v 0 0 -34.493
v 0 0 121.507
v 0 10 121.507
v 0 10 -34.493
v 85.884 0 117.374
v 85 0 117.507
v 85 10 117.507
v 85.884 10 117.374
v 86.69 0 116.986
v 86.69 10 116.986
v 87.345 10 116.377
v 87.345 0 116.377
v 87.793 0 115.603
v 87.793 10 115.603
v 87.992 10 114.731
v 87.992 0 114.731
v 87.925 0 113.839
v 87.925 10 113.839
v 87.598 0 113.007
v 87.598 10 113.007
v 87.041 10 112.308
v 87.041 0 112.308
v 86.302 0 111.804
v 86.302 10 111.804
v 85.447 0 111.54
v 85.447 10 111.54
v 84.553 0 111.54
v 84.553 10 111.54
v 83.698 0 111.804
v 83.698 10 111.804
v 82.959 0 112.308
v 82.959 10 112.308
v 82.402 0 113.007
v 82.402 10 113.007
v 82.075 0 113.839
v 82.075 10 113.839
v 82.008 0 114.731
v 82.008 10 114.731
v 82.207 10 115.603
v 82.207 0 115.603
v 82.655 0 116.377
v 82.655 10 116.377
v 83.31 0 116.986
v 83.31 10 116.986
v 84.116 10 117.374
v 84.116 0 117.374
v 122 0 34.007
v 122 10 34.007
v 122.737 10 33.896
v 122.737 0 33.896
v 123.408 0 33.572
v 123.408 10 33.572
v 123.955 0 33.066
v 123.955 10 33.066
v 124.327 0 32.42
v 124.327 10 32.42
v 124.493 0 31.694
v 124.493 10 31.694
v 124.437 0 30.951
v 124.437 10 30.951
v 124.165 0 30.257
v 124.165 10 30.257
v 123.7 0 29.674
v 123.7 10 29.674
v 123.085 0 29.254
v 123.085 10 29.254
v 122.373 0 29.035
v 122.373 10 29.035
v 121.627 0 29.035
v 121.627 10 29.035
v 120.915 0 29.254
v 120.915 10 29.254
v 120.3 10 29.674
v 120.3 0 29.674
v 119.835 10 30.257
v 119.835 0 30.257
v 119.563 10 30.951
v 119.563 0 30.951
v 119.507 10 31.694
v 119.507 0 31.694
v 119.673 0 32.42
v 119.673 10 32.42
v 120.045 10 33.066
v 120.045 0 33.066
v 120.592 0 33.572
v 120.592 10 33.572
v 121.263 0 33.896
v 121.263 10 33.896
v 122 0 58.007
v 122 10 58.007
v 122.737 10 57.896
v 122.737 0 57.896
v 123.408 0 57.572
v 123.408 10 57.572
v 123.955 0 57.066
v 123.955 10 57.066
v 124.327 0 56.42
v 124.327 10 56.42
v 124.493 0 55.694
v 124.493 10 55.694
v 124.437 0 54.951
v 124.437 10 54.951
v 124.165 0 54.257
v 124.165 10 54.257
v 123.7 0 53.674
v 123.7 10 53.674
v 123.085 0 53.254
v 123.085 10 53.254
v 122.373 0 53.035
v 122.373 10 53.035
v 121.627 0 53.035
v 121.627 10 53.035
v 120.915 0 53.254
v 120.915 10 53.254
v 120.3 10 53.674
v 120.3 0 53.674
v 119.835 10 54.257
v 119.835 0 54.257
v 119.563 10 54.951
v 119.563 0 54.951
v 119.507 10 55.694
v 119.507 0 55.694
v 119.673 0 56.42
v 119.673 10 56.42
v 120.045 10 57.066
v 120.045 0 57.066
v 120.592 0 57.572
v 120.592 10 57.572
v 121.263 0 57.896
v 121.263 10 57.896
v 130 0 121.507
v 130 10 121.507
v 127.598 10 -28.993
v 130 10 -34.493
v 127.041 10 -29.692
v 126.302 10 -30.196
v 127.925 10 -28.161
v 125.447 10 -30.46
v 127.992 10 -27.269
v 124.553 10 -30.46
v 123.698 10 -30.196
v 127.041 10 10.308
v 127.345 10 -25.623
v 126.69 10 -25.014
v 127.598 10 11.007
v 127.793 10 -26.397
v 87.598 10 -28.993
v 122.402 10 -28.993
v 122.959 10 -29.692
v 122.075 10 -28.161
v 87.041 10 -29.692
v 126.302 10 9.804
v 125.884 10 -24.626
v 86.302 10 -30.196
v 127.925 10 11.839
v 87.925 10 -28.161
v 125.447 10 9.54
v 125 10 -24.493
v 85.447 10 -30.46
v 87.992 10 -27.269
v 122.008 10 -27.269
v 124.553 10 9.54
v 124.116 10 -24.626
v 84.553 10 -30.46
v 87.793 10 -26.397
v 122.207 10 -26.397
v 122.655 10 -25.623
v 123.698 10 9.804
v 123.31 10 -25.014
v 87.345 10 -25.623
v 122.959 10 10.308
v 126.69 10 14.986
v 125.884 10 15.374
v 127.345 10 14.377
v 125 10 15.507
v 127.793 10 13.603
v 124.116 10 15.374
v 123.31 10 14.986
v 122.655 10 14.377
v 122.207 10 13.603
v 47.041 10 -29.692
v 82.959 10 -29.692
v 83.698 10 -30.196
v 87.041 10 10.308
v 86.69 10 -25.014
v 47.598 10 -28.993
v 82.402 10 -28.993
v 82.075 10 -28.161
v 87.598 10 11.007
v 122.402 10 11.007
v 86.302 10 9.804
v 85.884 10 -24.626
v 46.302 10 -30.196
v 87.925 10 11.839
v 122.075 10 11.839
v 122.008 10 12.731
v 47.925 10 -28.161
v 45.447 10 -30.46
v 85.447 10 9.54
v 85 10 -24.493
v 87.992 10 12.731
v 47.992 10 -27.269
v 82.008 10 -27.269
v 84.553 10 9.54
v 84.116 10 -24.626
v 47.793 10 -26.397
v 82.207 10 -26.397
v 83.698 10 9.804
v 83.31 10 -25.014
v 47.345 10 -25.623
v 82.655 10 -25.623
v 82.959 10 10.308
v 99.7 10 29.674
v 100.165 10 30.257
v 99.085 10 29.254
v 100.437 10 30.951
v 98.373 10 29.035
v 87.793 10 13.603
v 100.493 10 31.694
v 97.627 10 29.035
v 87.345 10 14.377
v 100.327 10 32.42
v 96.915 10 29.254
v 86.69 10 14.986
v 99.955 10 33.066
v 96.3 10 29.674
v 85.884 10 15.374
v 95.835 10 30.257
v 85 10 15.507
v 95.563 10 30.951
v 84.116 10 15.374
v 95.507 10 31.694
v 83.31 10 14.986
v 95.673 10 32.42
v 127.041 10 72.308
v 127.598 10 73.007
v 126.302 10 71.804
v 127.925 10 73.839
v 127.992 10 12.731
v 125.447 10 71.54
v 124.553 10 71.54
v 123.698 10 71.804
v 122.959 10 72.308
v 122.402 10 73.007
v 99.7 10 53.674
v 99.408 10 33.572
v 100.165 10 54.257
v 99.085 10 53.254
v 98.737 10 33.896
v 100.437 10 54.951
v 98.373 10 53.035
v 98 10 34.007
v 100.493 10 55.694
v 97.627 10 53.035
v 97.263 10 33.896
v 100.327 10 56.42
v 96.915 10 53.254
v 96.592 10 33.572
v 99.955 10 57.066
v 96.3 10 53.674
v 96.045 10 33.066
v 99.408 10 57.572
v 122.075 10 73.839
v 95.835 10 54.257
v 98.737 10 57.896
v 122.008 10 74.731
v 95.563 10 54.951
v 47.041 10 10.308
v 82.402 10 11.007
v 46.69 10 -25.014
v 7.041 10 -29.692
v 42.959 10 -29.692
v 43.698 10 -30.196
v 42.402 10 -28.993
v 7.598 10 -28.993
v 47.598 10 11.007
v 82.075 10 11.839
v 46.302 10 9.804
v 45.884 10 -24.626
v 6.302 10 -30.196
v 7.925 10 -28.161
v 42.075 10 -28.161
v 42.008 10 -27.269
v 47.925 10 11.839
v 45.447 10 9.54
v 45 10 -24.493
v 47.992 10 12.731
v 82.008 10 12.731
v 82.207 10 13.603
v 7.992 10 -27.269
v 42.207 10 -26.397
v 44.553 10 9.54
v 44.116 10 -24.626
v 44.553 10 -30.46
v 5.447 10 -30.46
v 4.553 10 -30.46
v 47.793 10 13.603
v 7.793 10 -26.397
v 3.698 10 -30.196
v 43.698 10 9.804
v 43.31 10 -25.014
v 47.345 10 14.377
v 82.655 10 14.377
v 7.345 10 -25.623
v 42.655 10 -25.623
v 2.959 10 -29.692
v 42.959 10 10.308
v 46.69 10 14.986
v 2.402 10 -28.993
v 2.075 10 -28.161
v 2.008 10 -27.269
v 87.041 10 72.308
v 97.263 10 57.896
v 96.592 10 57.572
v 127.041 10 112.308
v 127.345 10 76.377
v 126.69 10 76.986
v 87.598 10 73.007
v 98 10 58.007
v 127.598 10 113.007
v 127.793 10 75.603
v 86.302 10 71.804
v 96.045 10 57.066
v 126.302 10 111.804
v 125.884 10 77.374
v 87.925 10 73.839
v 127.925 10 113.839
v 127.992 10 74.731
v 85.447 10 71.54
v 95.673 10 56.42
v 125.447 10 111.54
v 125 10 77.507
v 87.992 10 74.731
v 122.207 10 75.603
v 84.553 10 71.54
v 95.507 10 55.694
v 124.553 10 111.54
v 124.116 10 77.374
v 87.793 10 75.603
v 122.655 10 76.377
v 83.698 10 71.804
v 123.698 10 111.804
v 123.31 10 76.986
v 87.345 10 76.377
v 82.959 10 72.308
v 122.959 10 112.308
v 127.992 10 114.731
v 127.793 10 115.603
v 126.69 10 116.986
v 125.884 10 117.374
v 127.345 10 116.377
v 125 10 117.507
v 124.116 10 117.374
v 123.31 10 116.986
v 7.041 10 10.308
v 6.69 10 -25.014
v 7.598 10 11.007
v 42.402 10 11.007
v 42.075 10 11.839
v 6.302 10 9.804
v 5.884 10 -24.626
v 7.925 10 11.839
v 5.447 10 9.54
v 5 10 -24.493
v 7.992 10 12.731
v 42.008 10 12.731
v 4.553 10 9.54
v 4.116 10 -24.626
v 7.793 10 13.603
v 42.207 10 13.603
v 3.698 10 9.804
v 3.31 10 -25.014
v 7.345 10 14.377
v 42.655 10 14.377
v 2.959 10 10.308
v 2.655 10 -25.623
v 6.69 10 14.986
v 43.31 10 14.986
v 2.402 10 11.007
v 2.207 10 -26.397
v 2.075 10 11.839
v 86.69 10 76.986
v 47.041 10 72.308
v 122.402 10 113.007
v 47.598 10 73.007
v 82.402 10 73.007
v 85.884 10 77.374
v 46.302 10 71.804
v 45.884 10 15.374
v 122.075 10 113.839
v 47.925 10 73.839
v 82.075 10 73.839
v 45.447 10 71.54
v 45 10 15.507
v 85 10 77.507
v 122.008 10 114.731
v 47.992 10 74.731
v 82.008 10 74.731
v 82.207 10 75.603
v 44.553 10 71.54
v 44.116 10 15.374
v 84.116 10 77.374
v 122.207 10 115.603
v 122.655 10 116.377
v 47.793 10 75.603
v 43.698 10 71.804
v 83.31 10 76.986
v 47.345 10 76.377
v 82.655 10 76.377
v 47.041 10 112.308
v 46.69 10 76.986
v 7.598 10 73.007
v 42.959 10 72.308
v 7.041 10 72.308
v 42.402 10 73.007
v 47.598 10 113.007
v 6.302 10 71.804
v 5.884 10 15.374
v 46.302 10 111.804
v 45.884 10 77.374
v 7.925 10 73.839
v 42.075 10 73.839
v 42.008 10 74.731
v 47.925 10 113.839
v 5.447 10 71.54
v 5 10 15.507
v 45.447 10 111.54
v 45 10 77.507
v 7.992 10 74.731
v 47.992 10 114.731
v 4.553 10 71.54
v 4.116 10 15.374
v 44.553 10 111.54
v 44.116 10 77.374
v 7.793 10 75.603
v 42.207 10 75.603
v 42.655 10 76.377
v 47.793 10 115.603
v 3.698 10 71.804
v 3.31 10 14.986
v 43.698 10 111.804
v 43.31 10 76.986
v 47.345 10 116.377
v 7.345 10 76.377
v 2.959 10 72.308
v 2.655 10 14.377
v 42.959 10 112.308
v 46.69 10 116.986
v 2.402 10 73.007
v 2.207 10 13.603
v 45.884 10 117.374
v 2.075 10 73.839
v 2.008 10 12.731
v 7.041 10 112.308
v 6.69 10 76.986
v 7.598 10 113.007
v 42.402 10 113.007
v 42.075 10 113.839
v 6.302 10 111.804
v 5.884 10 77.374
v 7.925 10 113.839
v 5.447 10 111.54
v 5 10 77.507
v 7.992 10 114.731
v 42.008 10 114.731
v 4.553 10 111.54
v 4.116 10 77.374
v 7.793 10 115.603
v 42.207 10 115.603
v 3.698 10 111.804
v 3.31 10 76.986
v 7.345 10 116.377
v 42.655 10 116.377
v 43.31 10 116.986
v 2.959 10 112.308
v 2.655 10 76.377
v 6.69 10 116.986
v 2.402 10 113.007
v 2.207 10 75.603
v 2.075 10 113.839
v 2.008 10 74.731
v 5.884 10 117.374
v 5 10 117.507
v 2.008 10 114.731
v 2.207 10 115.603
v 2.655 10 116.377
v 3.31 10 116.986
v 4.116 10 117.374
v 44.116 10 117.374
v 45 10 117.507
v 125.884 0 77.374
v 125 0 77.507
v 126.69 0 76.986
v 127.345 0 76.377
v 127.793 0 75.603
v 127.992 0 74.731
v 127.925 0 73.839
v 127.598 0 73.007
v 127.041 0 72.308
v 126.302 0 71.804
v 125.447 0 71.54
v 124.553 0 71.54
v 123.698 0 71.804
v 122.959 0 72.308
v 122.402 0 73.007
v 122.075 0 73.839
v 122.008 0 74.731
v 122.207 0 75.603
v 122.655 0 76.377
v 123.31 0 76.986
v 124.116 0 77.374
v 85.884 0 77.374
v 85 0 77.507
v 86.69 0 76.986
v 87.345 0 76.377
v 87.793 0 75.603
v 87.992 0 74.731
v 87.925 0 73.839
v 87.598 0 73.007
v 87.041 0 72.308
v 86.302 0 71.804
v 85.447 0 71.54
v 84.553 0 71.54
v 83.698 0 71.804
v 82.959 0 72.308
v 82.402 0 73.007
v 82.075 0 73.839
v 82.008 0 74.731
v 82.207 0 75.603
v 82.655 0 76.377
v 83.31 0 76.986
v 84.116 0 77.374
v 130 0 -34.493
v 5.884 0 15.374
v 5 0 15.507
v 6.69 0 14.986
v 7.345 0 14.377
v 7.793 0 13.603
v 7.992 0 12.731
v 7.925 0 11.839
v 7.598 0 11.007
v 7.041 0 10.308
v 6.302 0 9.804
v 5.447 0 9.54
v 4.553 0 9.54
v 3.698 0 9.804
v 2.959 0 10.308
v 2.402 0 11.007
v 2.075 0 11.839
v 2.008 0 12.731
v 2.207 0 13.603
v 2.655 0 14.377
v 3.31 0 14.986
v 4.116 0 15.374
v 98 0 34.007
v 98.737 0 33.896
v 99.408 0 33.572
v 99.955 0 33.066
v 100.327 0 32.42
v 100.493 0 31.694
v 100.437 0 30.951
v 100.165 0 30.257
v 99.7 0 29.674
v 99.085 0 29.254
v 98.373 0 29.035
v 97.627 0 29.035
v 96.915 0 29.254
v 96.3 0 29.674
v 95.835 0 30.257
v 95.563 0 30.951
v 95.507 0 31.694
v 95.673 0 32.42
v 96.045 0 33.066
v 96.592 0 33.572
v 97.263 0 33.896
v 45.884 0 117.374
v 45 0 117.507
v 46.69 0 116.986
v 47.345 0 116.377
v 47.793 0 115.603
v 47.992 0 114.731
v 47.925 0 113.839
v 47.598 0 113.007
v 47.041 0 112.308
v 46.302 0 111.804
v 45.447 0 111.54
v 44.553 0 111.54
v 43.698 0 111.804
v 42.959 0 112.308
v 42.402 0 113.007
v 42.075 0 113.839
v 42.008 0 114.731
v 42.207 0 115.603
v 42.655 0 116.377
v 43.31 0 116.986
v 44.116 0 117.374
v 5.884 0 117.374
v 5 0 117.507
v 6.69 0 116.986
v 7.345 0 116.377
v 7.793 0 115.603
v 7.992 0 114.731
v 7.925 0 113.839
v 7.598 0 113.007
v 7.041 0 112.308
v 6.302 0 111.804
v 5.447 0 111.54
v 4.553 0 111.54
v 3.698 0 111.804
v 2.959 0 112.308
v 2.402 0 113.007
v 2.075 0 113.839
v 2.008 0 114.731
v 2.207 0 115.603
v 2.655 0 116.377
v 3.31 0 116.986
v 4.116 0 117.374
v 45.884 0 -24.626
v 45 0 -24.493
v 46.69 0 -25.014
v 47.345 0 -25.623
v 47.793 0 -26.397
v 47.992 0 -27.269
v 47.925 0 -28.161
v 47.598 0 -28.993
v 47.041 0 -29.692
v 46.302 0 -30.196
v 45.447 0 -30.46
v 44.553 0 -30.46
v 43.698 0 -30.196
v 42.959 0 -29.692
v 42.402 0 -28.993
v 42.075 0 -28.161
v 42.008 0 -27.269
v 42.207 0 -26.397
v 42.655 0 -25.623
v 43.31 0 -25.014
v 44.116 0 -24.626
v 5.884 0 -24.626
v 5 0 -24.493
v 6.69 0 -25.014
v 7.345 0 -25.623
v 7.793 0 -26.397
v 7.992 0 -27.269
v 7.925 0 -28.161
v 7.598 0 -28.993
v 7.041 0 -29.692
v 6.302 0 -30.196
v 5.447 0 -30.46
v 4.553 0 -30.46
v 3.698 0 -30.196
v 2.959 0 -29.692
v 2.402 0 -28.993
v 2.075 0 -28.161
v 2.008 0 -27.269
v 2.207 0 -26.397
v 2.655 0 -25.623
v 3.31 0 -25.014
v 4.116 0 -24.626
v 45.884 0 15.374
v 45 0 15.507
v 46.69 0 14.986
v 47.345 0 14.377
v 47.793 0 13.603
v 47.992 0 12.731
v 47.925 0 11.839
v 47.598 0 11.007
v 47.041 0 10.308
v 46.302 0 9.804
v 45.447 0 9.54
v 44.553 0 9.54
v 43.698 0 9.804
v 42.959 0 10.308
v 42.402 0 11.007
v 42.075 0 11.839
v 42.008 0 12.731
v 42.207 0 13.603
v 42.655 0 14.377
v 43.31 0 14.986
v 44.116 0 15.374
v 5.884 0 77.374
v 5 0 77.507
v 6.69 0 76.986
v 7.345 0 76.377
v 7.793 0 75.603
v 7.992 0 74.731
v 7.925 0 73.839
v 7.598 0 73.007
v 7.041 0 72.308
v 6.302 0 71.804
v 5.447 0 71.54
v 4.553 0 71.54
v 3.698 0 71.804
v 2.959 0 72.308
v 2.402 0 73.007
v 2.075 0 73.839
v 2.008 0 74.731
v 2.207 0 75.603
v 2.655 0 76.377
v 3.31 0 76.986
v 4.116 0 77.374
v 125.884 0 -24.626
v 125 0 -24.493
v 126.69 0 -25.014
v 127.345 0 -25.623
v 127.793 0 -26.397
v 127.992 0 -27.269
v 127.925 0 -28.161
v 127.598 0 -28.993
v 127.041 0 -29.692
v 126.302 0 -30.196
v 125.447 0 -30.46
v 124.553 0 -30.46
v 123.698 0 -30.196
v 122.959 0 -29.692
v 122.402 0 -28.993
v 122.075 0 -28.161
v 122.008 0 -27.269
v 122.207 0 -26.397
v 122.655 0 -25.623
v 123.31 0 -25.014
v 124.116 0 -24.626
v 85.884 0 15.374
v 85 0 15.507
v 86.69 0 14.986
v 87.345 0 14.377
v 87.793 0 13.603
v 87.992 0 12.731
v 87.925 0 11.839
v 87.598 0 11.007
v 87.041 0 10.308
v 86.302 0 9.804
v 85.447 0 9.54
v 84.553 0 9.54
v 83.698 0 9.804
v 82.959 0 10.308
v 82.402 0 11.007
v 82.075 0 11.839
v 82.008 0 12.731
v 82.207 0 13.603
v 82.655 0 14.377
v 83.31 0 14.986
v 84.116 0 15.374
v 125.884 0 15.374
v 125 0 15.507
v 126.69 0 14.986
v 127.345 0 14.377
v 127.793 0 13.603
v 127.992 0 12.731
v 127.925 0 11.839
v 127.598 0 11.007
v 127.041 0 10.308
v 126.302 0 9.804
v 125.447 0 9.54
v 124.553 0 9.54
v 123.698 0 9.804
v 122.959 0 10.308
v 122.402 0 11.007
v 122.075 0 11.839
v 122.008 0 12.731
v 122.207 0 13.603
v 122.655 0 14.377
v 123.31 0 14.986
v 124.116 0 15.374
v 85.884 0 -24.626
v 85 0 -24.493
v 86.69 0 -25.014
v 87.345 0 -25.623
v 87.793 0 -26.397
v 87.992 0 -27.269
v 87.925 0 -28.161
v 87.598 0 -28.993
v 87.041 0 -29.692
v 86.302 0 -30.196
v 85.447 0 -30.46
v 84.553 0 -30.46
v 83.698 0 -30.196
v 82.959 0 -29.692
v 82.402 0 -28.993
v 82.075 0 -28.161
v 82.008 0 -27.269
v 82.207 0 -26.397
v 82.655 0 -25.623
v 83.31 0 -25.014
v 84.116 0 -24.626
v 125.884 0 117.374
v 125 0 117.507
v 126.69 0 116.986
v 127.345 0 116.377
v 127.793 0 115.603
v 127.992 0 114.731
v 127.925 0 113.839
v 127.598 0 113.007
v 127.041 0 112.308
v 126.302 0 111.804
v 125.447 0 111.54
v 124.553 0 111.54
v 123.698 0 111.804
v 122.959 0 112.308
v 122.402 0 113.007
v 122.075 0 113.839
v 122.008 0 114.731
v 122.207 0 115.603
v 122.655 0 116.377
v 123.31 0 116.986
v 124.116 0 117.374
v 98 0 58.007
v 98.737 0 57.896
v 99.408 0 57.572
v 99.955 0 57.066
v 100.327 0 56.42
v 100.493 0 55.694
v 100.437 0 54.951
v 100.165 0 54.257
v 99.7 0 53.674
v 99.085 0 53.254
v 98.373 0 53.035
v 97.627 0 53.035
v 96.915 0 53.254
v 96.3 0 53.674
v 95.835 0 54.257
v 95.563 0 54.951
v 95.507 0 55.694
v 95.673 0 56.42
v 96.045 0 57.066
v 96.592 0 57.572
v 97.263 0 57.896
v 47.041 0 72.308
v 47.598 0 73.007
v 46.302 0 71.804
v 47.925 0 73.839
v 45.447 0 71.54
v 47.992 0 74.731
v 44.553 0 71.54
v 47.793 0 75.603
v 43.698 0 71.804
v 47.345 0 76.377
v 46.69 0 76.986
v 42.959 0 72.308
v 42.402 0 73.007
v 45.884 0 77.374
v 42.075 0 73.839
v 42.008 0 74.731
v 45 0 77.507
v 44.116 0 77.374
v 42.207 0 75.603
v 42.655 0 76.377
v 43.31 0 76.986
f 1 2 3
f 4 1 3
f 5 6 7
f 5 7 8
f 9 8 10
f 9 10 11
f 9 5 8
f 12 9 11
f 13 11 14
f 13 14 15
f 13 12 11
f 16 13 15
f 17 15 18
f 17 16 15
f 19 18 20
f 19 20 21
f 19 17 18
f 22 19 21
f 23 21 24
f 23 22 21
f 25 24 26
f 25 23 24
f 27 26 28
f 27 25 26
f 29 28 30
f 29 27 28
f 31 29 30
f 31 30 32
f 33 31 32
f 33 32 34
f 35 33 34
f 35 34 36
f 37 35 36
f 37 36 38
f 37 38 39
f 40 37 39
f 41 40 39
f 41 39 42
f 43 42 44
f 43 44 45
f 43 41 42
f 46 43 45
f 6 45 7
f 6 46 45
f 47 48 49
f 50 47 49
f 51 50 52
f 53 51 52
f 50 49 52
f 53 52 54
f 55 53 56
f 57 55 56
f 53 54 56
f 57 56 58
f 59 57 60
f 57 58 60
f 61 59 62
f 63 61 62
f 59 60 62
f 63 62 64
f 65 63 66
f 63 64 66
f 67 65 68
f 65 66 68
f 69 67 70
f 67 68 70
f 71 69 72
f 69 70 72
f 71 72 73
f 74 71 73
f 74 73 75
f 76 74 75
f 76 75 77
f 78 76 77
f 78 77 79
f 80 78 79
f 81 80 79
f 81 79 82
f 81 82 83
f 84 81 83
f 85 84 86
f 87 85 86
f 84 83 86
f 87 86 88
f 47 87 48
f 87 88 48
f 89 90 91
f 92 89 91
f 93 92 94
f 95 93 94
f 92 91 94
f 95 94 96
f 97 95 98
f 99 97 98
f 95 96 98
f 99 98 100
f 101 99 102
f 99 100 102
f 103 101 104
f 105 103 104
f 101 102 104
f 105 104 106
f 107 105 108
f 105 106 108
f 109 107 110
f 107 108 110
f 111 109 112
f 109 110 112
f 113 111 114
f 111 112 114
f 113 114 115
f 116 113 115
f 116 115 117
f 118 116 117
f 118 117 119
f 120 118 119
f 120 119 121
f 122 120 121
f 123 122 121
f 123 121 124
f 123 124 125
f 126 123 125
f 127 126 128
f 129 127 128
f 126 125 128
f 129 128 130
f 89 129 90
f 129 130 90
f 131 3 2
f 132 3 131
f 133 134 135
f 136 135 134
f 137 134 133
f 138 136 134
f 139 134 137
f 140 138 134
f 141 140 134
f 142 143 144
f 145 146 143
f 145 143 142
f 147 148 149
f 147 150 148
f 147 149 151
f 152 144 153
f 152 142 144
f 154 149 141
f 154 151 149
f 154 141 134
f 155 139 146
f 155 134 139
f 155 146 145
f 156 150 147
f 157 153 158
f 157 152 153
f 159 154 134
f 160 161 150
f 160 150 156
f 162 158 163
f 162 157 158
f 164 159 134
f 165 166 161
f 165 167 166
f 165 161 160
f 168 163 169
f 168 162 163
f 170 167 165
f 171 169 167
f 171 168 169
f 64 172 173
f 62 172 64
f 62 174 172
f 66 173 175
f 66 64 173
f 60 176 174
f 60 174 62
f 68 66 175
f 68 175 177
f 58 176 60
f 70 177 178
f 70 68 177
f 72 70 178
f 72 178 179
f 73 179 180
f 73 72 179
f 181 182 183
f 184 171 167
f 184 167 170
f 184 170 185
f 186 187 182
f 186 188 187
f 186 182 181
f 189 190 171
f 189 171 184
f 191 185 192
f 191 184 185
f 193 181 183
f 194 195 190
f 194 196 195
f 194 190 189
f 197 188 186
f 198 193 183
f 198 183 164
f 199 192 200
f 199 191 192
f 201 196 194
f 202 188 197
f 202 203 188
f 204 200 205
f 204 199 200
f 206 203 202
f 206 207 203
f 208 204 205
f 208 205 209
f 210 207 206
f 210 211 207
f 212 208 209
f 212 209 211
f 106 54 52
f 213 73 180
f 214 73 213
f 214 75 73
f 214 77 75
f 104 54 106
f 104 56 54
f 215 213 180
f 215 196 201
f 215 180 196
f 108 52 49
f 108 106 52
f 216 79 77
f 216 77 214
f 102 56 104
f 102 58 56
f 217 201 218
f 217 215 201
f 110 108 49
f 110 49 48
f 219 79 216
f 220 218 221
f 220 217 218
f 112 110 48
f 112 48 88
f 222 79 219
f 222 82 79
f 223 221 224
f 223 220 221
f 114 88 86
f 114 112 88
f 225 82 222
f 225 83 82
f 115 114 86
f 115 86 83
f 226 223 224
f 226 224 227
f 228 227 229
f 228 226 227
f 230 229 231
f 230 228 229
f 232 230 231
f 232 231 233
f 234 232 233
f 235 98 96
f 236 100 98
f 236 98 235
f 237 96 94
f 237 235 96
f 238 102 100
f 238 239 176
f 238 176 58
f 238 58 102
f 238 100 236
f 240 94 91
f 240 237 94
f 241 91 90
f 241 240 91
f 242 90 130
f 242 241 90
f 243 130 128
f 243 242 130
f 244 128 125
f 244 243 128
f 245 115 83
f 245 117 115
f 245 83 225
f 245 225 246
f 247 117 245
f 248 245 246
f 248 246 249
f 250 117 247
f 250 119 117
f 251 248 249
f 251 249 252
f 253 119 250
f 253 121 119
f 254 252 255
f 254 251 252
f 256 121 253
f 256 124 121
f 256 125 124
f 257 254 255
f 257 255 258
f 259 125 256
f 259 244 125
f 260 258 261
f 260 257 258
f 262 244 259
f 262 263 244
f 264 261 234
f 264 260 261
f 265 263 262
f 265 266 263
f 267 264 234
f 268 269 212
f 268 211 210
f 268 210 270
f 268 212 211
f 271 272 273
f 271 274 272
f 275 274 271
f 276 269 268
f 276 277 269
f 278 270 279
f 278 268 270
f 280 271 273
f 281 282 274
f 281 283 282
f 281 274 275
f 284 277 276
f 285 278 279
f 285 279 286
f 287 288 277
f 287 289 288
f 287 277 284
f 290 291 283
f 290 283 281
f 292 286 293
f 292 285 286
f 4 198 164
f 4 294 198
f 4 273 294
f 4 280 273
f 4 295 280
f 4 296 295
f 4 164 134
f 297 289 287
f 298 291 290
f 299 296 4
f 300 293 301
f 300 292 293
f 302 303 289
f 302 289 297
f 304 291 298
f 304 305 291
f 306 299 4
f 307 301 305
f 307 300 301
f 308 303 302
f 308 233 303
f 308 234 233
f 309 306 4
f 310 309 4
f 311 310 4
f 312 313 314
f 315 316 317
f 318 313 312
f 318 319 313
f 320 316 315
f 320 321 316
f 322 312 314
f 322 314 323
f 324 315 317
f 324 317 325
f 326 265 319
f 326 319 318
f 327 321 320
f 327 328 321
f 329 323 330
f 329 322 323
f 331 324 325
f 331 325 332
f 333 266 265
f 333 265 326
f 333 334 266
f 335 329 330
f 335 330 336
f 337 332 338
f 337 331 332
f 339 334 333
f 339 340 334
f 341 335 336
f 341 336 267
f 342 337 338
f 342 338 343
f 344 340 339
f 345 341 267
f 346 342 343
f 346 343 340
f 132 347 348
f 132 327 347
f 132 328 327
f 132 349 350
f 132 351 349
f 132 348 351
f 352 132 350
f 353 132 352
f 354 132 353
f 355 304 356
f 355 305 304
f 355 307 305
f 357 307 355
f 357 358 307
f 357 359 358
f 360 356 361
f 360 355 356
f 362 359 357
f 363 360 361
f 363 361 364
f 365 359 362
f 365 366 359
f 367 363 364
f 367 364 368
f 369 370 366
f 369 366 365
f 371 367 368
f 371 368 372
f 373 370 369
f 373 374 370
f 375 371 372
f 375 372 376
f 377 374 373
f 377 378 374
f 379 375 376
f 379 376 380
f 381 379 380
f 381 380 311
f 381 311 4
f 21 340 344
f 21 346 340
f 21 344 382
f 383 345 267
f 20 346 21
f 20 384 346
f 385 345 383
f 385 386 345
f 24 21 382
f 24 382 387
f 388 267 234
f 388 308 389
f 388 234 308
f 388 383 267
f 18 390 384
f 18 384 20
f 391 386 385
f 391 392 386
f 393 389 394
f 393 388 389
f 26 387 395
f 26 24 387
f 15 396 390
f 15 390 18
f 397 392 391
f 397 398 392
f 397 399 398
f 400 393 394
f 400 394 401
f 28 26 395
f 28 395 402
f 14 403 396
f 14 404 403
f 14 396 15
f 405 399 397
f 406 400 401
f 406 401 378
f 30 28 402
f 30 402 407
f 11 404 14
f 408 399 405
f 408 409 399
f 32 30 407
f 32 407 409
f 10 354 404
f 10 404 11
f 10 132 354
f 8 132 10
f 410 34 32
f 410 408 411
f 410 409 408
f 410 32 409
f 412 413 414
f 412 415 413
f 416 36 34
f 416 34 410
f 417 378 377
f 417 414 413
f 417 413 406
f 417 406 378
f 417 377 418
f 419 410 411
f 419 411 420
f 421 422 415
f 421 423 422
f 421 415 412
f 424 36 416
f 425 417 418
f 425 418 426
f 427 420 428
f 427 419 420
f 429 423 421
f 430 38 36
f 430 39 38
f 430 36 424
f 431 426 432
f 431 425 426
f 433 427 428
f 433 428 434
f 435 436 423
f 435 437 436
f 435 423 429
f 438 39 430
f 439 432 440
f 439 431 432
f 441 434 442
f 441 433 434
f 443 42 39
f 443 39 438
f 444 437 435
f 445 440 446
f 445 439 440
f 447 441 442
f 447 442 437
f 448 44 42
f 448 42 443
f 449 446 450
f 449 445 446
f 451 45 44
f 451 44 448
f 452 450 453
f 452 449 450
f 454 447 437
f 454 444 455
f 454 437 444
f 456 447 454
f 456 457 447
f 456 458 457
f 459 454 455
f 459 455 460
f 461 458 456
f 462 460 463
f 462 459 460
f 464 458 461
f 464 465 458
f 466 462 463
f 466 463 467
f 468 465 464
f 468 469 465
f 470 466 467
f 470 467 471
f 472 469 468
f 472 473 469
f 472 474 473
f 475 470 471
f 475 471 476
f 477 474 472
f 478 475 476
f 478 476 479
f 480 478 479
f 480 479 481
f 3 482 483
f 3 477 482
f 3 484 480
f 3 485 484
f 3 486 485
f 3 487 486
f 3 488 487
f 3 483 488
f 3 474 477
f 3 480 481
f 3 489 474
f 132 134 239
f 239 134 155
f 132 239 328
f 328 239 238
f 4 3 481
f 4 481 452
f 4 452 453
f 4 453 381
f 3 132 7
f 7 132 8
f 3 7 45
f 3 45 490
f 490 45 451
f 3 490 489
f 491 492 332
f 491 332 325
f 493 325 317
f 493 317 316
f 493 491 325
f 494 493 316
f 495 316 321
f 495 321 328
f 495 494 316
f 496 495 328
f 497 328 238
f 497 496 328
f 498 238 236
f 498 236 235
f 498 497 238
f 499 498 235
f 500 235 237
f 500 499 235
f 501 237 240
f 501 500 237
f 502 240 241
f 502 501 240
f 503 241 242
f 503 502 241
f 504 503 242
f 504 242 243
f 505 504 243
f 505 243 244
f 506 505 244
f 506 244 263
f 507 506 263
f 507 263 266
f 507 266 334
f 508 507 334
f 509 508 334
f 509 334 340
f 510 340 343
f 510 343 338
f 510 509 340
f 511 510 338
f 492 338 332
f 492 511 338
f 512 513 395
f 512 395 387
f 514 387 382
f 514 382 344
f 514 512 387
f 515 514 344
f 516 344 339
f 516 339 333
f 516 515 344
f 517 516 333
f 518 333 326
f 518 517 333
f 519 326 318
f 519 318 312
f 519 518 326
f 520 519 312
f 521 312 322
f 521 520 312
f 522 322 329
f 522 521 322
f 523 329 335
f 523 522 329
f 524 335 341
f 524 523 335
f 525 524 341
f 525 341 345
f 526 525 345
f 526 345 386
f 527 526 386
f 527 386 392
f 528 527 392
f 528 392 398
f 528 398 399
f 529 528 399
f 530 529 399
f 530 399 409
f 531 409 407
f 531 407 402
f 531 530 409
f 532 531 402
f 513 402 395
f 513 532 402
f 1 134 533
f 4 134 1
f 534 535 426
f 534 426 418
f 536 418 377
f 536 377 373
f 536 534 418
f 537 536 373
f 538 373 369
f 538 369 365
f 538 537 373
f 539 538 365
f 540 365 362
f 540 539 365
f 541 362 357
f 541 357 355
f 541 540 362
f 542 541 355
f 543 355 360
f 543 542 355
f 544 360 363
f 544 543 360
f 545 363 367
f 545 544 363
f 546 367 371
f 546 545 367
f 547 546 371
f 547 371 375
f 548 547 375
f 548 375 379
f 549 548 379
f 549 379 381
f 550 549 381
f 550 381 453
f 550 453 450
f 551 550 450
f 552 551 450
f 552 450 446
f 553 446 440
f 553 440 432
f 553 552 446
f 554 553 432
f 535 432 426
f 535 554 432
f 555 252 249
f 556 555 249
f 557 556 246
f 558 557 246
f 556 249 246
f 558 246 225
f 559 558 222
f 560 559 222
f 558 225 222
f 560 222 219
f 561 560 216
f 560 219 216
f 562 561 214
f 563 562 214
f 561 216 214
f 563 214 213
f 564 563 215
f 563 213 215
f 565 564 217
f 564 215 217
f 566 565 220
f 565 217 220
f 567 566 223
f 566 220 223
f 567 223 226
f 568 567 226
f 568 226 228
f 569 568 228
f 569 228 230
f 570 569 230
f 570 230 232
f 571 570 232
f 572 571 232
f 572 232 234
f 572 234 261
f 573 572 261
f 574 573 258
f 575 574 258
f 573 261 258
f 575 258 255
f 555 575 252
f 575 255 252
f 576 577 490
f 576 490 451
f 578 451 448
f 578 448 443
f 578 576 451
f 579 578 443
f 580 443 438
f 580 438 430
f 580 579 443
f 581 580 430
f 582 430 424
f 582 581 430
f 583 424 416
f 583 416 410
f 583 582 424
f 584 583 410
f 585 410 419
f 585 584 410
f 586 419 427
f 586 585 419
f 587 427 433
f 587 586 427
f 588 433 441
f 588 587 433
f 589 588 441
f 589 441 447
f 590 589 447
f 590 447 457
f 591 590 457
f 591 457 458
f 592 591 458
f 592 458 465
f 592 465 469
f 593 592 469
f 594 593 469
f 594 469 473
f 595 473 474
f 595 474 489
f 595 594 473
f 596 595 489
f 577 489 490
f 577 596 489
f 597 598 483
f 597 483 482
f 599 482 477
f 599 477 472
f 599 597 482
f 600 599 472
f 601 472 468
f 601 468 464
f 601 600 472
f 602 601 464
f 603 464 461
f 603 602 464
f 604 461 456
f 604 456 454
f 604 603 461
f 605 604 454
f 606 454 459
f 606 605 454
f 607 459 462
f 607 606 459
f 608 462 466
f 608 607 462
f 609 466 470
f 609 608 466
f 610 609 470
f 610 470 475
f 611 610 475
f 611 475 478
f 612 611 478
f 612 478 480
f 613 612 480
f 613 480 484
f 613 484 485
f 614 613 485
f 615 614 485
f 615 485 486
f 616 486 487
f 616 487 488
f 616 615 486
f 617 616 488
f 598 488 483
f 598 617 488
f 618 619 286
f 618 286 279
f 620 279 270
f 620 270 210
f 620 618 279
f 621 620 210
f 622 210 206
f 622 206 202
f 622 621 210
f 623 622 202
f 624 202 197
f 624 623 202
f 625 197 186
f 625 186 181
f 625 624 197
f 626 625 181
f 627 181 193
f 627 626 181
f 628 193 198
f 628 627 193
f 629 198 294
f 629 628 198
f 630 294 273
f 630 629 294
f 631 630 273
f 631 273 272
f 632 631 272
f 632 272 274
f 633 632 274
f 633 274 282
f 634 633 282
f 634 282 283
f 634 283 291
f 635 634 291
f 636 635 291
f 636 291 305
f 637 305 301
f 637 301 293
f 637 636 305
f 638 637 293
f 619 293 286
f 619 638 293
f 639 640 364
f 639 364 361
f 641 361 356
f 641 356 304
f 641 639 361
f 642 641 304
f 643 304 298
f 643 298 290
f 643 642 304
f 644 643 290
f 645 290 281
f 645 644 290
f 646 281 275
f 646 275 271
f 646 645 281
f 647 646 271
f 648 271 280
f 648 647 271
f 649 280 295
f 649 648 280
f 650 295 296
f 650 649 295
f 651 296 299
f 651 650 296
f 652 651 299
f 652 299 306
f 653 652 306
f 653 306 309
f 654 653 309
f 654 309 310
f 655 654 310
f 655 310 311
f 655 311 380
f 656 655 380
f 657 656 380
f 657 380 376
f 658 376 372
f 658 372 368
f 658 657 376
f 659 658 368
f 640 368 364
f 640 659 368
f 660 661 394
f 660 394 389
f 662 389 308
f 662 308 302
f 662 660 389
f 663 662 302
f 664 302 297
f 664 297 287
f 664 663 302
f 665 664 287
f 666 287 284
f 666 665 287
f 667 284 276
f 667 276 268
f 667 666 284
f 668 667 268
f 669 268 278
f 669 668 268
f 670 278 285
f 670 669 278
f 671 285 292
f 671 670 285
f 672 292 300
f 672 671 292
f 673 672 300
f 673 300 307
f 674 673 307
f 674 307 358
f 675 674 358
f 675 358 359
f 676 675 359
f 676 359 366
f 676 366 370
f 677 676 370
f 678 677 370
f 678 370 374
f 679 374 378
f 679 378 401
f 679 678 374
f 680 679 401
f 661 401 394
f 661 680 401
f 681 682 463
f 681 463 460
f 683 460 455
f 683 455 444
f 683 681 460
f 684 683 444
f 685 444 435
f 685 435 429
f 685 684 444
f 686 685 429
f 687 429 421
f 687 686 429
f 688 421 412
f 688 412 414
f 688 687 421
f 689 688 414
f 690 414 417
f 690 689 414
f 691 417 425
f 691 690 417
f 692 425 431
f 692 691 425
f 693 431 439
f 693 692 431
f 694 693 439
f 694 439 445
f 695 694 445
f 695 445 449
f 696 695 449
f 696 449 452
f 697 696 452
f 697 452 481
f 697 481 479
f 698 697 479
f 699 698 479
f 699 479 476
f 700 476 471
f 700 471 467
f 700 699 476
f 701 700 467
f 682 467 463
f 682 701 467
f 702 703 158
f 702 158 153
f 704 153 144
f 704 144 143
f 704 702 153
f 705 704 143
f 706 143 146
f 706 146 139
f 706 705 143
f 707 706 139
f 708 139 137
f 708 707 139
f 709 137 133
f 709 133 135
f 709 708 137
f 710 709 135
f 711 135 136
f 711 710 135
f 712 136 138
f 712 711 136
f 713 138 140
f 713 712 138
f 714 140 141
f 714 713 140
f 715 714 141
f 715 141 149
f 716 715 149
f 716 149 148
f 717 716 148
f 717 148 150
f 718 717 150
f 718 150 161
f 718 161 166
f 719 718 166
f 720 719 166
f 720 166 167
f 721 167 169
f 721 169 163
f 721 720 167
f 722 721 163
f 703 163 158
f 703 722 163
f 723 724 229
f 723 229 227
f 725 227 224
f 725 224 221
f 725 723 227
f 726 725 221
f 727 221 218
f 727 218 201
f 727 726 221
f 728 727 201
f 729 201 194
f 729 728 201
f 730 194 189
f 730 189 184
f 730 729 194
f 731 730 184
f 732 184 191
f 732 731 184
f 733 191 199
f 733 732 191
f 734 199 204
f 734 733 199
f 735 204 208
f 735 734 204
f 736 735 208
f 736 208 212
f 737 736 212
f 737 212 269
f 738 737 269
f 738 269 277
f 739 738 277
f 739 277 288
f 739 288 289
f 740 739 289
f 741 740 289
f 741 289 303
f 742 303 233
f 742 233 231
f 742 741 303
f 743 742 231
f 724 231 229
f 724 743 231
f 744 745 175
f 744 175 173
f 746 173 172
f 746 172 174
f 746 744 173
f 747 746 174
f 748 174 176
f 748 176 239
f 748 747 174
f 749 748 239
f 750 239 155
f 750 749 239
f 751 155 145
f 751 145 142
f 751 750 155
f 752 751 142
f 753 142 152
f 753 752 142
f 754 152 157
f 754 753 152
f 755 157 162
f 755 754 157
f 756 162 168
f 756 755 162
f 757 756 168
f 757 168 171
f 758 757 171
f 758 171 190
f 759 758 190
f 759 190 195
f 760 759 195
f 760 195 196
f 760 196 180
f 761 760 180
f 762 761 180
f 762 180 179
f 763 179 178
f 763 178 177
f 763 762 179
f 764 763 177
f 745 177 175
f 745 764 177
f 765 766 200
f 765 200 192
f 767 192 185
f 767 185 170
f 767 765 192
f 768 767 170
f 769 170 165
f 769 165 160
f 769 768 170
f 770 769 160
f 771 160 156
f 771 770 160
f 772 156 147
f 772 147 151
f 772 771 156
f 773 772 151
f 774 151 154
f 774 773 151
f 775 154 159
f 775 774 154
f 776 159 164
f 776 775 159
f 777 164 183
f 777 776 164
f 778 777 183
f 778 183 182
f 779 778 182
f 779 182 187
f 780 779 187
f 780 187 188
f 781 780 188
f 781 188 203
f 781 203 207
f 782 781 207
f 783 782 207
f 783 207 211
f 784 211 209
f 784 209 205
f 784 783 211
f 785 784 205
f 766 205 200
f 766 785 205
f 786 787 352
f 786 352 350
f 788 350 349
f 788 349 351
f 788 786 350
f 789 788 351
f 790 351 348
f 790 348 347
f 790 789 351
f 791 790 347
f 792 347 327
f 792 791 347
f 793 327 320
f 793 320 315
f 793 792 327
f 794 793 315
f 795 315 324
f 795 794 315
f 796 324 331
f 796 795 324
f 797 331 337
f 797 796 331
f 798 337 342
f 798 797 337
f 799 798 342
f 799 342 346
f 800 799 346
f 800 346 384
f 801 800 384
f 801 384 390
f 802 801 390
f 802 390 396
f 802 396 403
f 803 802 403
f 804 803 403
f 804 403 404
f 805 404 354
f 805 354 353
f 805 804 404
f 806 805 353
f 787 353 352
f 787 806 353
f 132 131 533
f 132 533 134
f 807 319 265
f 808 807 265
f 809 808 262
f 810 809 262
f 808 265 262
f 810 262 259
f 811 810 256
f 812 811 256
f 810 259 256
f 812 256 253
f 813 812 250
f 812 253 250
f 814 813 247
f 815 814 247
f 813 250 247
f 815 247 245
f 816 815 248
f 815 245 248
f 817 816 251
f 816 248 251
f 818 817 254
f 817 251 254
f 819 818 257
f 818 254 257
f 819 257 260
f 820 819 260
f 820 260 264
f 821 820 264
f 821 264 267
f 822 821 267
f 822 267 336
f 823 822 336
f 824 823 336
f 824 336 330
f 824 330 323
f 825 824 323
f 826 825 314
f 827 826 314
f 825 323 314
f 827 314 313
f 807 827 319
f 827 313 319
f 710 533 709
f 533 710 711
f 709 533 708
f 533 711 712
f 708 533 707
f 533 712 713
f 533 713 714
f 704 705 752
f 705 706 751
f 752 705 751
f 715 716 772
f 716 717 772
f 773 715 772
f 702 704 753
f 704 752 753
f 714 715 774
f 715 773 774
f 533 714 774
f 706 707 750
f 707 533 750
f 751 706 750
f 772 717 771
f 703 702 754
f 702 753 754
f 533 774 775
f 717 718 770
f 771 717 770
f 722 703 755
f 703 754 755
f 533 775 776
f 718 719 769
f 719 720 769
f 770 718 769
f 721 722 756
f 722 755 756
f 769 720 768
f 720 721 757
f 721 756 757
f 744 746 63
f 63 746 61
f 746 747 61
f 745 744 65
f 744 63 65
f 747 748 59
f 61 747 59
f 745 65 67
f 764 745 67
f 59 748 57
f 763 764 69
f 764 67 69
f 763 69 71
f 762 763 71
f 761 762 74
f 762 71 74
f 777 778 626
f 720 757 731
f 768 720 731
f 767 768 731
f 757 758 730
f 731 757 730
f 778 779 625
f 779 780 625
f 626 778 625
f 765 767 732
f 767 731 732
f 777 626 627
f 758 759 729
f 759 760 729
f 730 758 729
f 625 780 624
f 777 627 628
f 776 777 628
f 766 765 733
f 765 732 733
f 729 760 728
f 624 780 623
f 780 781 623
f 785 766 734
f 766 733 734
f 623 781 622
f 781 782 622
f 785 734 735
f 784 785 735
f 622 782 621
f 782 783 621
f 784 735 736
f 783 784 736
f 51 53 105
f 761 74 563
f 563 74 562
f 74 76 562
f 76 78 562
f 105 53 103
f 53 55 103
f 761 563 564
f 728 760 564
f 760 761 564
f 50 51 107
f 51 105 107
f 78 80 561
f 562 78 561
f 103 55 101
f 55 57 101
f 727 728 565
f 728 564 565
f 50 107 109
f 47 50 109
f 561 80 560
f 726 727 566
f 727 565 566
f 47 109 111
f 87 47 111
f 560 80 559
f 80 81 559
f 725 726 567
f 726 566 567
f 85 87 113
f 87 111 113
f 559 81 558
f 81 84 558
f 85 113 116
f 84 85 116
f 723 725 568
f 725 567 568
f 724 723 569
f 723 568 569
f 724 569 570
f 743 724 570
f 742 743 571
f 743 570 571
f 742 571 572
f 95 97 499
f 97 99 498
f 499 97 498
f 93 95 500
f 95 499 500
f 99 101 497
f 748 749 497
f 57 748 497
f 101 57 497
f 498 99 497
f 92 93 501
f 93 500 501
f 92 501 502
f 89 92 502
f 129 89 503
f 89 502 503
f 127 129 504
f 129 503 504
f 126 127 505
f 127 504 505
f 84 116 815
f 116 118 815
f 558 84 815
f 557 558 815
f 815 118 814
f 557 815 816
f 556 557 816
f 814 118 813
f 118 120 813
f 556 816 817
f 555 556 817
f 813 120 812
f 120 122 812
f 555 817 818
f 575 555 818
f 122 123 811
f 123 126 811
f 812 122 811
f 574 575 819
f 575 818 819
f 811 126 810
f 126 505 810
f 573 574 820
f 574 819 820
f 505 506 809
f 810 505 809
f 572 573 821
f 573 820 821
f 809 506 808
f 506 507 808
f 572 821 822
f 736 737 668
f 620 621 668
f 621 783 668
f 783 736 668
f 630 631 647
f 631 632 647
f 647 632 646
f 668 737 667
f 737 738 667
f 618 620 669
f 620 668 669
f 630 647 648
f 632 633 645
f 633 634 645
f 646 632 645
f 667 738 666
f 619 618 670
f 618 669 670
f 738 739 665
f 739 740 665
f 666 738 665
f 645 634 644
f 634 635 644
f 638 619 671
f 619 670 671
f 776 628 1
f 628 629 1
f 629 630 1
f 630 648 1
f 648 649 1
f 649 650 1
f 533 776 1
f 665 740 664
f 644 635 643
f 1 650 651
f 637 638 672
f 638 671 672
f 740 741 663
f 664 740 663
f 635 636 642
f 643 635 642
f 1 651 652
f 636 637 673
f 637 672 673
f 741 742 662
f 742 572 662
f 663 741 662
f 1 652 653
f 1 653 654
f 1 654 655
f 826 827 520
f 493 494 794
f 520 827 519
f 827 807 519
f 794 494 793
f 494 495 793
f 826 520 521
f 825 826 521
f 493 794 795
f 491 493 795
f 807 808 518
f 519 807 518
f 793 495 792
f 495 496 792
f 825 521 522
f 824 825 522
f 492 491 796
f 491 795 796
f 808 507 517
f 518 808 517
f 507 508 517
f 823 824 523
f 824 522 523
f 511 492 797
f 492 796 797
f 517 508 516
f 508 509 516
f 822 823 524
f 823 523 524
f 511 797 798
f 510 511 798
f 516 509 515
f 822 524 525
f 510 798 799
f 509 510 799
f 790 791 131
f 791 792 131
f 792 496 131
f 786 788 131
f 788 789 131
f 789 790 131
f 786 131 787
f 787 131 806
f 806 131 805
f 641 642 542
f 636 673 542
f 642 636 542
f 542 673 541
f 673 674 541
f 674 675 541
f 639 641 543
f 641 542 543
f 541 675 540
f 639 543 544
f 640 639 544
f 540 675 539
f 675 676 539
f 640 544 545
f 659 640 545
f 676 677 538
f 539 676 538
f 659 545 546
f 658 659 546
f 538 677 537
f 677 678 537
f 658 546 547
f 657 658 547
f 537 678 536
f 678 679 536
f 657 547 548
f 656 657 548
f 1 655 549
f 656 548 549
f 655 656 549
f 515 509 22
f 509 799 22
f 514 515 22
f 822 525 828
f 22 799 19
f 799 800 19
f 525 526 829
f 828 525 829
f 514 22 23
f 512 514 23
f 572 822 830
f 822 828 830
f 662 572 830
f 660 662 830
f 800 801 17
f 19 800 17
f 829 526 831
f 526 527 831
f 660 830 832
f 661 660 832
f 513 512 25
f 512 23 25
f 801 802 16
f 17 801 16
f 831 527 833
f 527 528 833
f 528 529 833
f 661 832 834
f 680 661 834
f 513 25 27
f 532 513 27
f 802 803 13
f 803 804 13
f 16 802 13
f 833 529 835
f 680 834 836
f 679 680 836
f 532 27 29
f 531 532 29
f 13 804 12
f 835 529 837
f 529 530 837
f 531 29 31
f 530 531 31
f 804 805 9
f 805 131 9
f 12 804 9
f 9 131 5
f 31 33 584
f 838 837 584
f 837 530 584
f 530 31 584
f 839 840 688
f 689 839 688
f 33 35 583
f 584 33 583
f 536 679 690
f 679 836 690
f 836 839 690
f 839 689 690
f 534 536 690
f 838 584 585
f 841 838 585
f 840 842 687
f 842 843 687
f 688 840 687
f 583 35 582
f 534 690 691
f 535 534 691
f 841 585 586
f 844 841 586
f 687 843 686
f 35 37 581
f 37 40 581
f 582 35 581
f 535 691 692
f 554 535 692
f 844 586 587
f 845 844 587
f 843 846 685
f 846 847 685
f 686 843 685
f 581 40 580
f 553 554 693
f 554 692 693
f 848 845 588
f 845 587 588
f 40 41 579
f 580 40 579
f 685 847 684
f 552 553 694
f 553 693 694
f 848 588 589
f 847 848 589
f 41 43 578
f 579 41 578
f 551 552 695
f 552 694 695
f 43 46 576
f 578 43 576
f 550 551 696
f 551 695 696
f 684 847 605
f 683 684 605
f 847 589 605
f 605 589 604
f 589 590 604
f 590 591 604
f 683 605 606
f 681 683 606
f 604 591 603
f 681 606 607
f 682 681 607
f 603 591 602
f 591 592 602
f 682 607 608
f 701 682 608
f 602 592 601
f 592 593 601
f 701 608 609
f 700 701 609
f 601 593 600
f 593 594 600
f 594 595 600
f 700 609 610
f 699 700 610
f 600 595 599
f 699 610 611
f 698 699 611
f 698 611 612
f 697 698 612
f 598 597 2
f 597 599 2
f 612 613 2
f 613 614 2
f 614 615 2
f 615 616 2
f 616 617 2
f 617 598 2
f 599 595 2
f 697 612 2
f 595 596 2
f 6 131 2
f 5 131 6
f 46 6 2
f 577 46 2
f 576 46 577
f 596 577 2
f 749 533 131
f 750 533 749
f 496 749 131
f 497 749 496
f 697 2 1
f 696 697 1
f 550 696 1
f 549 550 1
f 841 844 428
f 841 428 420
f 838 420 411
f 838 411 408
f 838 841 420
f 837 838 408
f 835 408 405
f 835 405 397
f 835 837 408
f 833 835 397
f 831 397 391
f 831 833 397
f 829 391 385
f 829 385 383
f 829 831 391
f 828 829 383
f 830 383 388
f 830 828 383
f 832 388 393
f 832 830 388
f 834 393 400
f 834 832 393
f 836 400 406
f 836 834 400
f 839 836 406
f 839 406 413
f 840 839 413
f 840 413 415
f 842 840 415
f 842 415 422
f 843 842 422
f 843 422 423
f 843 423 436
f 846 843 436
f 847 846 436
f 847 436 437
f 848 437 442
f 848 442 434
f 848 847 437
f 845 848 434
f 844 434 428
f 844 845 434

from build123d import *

# Parameters (mm, degrees)
SKETCH1_W            = 130
SKETCH1_H            = 156
SKETCH1_R            = 3
BOSS_EXTRUDE1_DEPTH  = 10
SKETCH2_R            = 2.5
CUT_EXTRUDE1_DEPTH   = 10
SKETCH3_W            = 130
SKETCH3_H            = 10
BOSS_EXTRUDE2_DEPTH  = 10
SKETCH4_W            = 130
SKETCH4_H            = 10
BOSS_EXTRUDE3_DEPTH  = 10
SKETCH5_W            = 130
SKETCH5_H            = 10
CUT_EXTRUDE2_DEPTH   = 12.25
SKETCH6_W            = 130
SKETCH6_H            = 12.25
CUT_EXTRUDE3_DEPTH   = 20
SKETCH7_W            = 130
SKETCH7_H            = 10
BOSS_EXTRUDE5_DEPTH  = 2.25
SKETCH8_W            = 130
SKETCH8_H            = 10
BOSS_EXTRUDE6_DEPTH  = 2.25
SKETCH10_W           = 130
SKETCH10_H           = 10
BOSS_EXTRUDE8_DEPTH  = 10
SKETCH11_W           = 130
SKETCH11_H           = 10
BOSS_EXTRUDE10_DEPTH = 7
SKETCH12_W           = 130
SKETCH12_H           = 10
CUT_EXTRUDE4_DEPTH   = 7
SKETCH14_W           = 130
SKETCH14_H           = 10
CUT_EXTRUDE5_DEPTH   = 10


with BuildPart() as part:
    # Sketch1 → Boss-Extrude1 (new body)
    with BuildSketch(Plane(origin=(0, 0, 0), x_dir=(1, 0, 0), z_dir=(0, 1, 0))):
        with Locations((65, -43.506875339)):
            Rectangle(SKETCH1_W, SKETCH1_H)
        with Locations(Location((5, 27.493124661, 0), (0, 0, 270))):
            Circle(SKETCH1_R, mode=Mode.SUBTRACT)
        with Locations(Location((45, 27.493124661, 0), (0, 0, 270))):
            Circle(SKETCH1_R, mode=Mode.SUBTRACT)
        with Locations(Location((45, -12.506875339, 0), (0, 0, 270))):
            Circle(SKETCH1_R, mode=Mode.SUBTRACT)
        with Locations(Location((5, -12.506875339, 0), (0, 0, 270))):
            Circle(SKETCH1_R, mode=Mode.SUBTRACT)
        with Locations(Location((85, 27.493124661, 0), (0, 0, 270))):
            Circle(SKETCH1_R, mode=Mode.SUBTRACT)
        with Locations(Location((125, 27.493124661, 0), (0, 0, 270))):
            Circle(SKETCH1_R, mode=Mode.SUBTRACT)
        with Locations(Location((85, -12.506875339, 0), (0, 0, 270))):
            Circle(SKETCH1_R, mode=Mode.SUBTRACT)
        with Locations(Location((125, -12.506875339, 0), (0, 0, 270))):
            Circle(SKETCH1_R, mode=Mode.SUBTRACT)
        with Locations(Location((85, -74.506875339, 0), (0, 0, 270))):
            Circle(SKETCH1_R, mode=Mode.SUBTRACT)
        with Locations(Location((125, -74.506875339, 0), (0, 0, 270))):
            Circle(SKETCH1_R, mode=Mode.SUBTRACT)
        with Locations(Location((125, -114.506875339, 0), (0, 0, 270))):
            Circle(SKETCH1_R, mode=Mode.SUBTRACT)
        with Locations(Location((85, -114.506875339, 0), (0, 0, 270))):
            Circle(SKETCH1_R, mode=Mode.SUBTRACT)
        with Locations(Location((5, -74.506875339, 0), (0, 0, 270))):
            Circle(SKETCH1_R, mode=Mode.SUBTRACT)
        with Locations(Location((45, -74.506875339, 0), (0, 0, 270))):
            Circle(SKETCH1_R, mode=Mode.SUBTRACT)
        with Locations(Location((5, -114.506875339, 0), (0, 0, 270))):
            Circle(SKETCH1_R, mode=Mode.SUBTRACT)
        with Locations(Location((45, -114.506875339, 0), (0, 0, 270))):
            Circle(SKETCH1_R, mode=Mode.SUBTRACT)
    extrude(amount=BOSS_EXTRUDE1_DEPTH)

    # Sketch2 → Cut-Extrude1 (cut)
    with BuildSketch(Plane(origin=(0, 10, 0), x_dir=(1, 0, 0), z_dir=(0, 1, 0))):
        with Locations(Location((98, -31.506875339, 0), (0, 0, 270))):
            Circle(SKETCH2_R)
        with Locations(Location((98, -55.506875339, 0), (0, 0, 270))):
            Circle(SKETCH2_R)
        with Locations(Location((122, -55.506875339, 0), (0, 0, 270))):
            Circle(SKETCH2_R)
        with Locations(Location((122, -31.506875339, 0), (0, 0, 270))):
            Circle(SKETCH2_R)
    extrude(amount=-CUT_EXTRUDE1_DEPTH, mode=Mode.SUBTRACT)

    # Sketch3 → Boss-Extrude2 (add)
    with BuildSketch(Plane(origin=(0, 0, -34.493124661), x_dir=(-1, 0, 0), z_dir=(0, 0, -1))):
        with Locations((-65, 5)):
            Rectangle(SKETCH3_W, SKETCH3_H)
    extrude(amount=BOSS_EXTRUDE2_DEPTH)

    # Sketch4 → Boss-Extrude3 (add)
    with BuildSketch(Plane.XY.offset(121.506875339)):
        with Locations((65, 5)):
            Rectangle(SKETCH4_W, SKETCH4_H)
    extrude(amount=BOSS_EXTRUDE3_DEPTH)

    # Sketch5 → Cut-Extrude2 (cut)
    with BuildSketch(Plane.XY.offset(131.506875339)):
        with Locations((65, 5)):
            Rectangle(SKETCH5_W, SKETCH5_H)
    extrude(amount=-CUT_EXTRUDE2_DEPTH, mode=Mode.SUBTRACT)

    # Sketch6 → Cut-Extrude3 (cut)
    with BuildSketch(Plane(origin=(0, 10, 0), x_dir=(1, 0, 0), z_dir=(0, 1, 0))):
        with Locations((65, 38.368124661)):
            Rectangle(SKETCH6_W, SKETCH6_H)
    extrude(amount=-CUT_EXTRUDE3_DEPTH, mode=Mode.SUBTRACT)

    # Sketch7 → Boss-Extrude5 (add)
    with BuildSketch(Plane(origin=(0, 0, -32.243124661), x_dir=(-1, 0, 0), z_dir=(0, 0, -1))):
        with Locations((-65, 5)):
            Rectangle(SKETCH7_W, SKETCH7_H)
    extrude(amount=BOSS_EXTRUDE5_DEPTH)

    # Sketch8 → Boss-Extrude6 (add)
    with BuildSketch(Plane.XY.offset(119.256875339)):
        with Locations((65, 5)):
            Rectangle(SKETCH8_W, SKETCH8_H)
    extrude(amount=BOSS_EXTRUDE6_DEPTH)

    # Sketch10 → Boss-Extrude8 (add)
    with BuildSketch(Plane.XY.offset(121.506875339)):
        with Locations((65, 5)):
            Rectangle(SKETCH10_W, SKETCH10_H)
    extrude(amount=BOSS_EXTRUDE8_DEPTH)

    # Sketch11 → Boss-Extrude10 (add)
    with BuildSketch(Plane(origin=(0, 0, -34.493124661), x_dir=(-1, 0, 0), z_dir=(0, 0, -1))):
        with Locations((-65, 5)):
            Rectangle(SKETCH11_W, SKETCH11_H)
    extrude(amount=BOSS_EXTRUDE10_DEPTH)

    # Sketch12 → Cut-Extrude4 (cut)
    with BuildSketch(Plane(origin=(0, 0, -41.493124661), x_dir=(-1, 0, 0), z_dir=(0, 0, -1))):
        with Locations((-65, 5)):
            Rectangle(SKETCH12_W, SKETCH12_H)
    extrude(amount=-CUT_EXTRUDE4_DEPTH, mode=Mode.SUBTRACT)

    # Sketch14 → Cut-Extrude5 (cut)
    with BuildSketch(Plane.XY.offset(131.506875339)):
        with Locations((65, 5)):
            Rectangle(SKETCH14_W, SKETCH14_H)
    extrude(amount=-CUT_EXTRUDE5_DEPTH, mode=Mode.SUBTRACT)


solid = part.part
